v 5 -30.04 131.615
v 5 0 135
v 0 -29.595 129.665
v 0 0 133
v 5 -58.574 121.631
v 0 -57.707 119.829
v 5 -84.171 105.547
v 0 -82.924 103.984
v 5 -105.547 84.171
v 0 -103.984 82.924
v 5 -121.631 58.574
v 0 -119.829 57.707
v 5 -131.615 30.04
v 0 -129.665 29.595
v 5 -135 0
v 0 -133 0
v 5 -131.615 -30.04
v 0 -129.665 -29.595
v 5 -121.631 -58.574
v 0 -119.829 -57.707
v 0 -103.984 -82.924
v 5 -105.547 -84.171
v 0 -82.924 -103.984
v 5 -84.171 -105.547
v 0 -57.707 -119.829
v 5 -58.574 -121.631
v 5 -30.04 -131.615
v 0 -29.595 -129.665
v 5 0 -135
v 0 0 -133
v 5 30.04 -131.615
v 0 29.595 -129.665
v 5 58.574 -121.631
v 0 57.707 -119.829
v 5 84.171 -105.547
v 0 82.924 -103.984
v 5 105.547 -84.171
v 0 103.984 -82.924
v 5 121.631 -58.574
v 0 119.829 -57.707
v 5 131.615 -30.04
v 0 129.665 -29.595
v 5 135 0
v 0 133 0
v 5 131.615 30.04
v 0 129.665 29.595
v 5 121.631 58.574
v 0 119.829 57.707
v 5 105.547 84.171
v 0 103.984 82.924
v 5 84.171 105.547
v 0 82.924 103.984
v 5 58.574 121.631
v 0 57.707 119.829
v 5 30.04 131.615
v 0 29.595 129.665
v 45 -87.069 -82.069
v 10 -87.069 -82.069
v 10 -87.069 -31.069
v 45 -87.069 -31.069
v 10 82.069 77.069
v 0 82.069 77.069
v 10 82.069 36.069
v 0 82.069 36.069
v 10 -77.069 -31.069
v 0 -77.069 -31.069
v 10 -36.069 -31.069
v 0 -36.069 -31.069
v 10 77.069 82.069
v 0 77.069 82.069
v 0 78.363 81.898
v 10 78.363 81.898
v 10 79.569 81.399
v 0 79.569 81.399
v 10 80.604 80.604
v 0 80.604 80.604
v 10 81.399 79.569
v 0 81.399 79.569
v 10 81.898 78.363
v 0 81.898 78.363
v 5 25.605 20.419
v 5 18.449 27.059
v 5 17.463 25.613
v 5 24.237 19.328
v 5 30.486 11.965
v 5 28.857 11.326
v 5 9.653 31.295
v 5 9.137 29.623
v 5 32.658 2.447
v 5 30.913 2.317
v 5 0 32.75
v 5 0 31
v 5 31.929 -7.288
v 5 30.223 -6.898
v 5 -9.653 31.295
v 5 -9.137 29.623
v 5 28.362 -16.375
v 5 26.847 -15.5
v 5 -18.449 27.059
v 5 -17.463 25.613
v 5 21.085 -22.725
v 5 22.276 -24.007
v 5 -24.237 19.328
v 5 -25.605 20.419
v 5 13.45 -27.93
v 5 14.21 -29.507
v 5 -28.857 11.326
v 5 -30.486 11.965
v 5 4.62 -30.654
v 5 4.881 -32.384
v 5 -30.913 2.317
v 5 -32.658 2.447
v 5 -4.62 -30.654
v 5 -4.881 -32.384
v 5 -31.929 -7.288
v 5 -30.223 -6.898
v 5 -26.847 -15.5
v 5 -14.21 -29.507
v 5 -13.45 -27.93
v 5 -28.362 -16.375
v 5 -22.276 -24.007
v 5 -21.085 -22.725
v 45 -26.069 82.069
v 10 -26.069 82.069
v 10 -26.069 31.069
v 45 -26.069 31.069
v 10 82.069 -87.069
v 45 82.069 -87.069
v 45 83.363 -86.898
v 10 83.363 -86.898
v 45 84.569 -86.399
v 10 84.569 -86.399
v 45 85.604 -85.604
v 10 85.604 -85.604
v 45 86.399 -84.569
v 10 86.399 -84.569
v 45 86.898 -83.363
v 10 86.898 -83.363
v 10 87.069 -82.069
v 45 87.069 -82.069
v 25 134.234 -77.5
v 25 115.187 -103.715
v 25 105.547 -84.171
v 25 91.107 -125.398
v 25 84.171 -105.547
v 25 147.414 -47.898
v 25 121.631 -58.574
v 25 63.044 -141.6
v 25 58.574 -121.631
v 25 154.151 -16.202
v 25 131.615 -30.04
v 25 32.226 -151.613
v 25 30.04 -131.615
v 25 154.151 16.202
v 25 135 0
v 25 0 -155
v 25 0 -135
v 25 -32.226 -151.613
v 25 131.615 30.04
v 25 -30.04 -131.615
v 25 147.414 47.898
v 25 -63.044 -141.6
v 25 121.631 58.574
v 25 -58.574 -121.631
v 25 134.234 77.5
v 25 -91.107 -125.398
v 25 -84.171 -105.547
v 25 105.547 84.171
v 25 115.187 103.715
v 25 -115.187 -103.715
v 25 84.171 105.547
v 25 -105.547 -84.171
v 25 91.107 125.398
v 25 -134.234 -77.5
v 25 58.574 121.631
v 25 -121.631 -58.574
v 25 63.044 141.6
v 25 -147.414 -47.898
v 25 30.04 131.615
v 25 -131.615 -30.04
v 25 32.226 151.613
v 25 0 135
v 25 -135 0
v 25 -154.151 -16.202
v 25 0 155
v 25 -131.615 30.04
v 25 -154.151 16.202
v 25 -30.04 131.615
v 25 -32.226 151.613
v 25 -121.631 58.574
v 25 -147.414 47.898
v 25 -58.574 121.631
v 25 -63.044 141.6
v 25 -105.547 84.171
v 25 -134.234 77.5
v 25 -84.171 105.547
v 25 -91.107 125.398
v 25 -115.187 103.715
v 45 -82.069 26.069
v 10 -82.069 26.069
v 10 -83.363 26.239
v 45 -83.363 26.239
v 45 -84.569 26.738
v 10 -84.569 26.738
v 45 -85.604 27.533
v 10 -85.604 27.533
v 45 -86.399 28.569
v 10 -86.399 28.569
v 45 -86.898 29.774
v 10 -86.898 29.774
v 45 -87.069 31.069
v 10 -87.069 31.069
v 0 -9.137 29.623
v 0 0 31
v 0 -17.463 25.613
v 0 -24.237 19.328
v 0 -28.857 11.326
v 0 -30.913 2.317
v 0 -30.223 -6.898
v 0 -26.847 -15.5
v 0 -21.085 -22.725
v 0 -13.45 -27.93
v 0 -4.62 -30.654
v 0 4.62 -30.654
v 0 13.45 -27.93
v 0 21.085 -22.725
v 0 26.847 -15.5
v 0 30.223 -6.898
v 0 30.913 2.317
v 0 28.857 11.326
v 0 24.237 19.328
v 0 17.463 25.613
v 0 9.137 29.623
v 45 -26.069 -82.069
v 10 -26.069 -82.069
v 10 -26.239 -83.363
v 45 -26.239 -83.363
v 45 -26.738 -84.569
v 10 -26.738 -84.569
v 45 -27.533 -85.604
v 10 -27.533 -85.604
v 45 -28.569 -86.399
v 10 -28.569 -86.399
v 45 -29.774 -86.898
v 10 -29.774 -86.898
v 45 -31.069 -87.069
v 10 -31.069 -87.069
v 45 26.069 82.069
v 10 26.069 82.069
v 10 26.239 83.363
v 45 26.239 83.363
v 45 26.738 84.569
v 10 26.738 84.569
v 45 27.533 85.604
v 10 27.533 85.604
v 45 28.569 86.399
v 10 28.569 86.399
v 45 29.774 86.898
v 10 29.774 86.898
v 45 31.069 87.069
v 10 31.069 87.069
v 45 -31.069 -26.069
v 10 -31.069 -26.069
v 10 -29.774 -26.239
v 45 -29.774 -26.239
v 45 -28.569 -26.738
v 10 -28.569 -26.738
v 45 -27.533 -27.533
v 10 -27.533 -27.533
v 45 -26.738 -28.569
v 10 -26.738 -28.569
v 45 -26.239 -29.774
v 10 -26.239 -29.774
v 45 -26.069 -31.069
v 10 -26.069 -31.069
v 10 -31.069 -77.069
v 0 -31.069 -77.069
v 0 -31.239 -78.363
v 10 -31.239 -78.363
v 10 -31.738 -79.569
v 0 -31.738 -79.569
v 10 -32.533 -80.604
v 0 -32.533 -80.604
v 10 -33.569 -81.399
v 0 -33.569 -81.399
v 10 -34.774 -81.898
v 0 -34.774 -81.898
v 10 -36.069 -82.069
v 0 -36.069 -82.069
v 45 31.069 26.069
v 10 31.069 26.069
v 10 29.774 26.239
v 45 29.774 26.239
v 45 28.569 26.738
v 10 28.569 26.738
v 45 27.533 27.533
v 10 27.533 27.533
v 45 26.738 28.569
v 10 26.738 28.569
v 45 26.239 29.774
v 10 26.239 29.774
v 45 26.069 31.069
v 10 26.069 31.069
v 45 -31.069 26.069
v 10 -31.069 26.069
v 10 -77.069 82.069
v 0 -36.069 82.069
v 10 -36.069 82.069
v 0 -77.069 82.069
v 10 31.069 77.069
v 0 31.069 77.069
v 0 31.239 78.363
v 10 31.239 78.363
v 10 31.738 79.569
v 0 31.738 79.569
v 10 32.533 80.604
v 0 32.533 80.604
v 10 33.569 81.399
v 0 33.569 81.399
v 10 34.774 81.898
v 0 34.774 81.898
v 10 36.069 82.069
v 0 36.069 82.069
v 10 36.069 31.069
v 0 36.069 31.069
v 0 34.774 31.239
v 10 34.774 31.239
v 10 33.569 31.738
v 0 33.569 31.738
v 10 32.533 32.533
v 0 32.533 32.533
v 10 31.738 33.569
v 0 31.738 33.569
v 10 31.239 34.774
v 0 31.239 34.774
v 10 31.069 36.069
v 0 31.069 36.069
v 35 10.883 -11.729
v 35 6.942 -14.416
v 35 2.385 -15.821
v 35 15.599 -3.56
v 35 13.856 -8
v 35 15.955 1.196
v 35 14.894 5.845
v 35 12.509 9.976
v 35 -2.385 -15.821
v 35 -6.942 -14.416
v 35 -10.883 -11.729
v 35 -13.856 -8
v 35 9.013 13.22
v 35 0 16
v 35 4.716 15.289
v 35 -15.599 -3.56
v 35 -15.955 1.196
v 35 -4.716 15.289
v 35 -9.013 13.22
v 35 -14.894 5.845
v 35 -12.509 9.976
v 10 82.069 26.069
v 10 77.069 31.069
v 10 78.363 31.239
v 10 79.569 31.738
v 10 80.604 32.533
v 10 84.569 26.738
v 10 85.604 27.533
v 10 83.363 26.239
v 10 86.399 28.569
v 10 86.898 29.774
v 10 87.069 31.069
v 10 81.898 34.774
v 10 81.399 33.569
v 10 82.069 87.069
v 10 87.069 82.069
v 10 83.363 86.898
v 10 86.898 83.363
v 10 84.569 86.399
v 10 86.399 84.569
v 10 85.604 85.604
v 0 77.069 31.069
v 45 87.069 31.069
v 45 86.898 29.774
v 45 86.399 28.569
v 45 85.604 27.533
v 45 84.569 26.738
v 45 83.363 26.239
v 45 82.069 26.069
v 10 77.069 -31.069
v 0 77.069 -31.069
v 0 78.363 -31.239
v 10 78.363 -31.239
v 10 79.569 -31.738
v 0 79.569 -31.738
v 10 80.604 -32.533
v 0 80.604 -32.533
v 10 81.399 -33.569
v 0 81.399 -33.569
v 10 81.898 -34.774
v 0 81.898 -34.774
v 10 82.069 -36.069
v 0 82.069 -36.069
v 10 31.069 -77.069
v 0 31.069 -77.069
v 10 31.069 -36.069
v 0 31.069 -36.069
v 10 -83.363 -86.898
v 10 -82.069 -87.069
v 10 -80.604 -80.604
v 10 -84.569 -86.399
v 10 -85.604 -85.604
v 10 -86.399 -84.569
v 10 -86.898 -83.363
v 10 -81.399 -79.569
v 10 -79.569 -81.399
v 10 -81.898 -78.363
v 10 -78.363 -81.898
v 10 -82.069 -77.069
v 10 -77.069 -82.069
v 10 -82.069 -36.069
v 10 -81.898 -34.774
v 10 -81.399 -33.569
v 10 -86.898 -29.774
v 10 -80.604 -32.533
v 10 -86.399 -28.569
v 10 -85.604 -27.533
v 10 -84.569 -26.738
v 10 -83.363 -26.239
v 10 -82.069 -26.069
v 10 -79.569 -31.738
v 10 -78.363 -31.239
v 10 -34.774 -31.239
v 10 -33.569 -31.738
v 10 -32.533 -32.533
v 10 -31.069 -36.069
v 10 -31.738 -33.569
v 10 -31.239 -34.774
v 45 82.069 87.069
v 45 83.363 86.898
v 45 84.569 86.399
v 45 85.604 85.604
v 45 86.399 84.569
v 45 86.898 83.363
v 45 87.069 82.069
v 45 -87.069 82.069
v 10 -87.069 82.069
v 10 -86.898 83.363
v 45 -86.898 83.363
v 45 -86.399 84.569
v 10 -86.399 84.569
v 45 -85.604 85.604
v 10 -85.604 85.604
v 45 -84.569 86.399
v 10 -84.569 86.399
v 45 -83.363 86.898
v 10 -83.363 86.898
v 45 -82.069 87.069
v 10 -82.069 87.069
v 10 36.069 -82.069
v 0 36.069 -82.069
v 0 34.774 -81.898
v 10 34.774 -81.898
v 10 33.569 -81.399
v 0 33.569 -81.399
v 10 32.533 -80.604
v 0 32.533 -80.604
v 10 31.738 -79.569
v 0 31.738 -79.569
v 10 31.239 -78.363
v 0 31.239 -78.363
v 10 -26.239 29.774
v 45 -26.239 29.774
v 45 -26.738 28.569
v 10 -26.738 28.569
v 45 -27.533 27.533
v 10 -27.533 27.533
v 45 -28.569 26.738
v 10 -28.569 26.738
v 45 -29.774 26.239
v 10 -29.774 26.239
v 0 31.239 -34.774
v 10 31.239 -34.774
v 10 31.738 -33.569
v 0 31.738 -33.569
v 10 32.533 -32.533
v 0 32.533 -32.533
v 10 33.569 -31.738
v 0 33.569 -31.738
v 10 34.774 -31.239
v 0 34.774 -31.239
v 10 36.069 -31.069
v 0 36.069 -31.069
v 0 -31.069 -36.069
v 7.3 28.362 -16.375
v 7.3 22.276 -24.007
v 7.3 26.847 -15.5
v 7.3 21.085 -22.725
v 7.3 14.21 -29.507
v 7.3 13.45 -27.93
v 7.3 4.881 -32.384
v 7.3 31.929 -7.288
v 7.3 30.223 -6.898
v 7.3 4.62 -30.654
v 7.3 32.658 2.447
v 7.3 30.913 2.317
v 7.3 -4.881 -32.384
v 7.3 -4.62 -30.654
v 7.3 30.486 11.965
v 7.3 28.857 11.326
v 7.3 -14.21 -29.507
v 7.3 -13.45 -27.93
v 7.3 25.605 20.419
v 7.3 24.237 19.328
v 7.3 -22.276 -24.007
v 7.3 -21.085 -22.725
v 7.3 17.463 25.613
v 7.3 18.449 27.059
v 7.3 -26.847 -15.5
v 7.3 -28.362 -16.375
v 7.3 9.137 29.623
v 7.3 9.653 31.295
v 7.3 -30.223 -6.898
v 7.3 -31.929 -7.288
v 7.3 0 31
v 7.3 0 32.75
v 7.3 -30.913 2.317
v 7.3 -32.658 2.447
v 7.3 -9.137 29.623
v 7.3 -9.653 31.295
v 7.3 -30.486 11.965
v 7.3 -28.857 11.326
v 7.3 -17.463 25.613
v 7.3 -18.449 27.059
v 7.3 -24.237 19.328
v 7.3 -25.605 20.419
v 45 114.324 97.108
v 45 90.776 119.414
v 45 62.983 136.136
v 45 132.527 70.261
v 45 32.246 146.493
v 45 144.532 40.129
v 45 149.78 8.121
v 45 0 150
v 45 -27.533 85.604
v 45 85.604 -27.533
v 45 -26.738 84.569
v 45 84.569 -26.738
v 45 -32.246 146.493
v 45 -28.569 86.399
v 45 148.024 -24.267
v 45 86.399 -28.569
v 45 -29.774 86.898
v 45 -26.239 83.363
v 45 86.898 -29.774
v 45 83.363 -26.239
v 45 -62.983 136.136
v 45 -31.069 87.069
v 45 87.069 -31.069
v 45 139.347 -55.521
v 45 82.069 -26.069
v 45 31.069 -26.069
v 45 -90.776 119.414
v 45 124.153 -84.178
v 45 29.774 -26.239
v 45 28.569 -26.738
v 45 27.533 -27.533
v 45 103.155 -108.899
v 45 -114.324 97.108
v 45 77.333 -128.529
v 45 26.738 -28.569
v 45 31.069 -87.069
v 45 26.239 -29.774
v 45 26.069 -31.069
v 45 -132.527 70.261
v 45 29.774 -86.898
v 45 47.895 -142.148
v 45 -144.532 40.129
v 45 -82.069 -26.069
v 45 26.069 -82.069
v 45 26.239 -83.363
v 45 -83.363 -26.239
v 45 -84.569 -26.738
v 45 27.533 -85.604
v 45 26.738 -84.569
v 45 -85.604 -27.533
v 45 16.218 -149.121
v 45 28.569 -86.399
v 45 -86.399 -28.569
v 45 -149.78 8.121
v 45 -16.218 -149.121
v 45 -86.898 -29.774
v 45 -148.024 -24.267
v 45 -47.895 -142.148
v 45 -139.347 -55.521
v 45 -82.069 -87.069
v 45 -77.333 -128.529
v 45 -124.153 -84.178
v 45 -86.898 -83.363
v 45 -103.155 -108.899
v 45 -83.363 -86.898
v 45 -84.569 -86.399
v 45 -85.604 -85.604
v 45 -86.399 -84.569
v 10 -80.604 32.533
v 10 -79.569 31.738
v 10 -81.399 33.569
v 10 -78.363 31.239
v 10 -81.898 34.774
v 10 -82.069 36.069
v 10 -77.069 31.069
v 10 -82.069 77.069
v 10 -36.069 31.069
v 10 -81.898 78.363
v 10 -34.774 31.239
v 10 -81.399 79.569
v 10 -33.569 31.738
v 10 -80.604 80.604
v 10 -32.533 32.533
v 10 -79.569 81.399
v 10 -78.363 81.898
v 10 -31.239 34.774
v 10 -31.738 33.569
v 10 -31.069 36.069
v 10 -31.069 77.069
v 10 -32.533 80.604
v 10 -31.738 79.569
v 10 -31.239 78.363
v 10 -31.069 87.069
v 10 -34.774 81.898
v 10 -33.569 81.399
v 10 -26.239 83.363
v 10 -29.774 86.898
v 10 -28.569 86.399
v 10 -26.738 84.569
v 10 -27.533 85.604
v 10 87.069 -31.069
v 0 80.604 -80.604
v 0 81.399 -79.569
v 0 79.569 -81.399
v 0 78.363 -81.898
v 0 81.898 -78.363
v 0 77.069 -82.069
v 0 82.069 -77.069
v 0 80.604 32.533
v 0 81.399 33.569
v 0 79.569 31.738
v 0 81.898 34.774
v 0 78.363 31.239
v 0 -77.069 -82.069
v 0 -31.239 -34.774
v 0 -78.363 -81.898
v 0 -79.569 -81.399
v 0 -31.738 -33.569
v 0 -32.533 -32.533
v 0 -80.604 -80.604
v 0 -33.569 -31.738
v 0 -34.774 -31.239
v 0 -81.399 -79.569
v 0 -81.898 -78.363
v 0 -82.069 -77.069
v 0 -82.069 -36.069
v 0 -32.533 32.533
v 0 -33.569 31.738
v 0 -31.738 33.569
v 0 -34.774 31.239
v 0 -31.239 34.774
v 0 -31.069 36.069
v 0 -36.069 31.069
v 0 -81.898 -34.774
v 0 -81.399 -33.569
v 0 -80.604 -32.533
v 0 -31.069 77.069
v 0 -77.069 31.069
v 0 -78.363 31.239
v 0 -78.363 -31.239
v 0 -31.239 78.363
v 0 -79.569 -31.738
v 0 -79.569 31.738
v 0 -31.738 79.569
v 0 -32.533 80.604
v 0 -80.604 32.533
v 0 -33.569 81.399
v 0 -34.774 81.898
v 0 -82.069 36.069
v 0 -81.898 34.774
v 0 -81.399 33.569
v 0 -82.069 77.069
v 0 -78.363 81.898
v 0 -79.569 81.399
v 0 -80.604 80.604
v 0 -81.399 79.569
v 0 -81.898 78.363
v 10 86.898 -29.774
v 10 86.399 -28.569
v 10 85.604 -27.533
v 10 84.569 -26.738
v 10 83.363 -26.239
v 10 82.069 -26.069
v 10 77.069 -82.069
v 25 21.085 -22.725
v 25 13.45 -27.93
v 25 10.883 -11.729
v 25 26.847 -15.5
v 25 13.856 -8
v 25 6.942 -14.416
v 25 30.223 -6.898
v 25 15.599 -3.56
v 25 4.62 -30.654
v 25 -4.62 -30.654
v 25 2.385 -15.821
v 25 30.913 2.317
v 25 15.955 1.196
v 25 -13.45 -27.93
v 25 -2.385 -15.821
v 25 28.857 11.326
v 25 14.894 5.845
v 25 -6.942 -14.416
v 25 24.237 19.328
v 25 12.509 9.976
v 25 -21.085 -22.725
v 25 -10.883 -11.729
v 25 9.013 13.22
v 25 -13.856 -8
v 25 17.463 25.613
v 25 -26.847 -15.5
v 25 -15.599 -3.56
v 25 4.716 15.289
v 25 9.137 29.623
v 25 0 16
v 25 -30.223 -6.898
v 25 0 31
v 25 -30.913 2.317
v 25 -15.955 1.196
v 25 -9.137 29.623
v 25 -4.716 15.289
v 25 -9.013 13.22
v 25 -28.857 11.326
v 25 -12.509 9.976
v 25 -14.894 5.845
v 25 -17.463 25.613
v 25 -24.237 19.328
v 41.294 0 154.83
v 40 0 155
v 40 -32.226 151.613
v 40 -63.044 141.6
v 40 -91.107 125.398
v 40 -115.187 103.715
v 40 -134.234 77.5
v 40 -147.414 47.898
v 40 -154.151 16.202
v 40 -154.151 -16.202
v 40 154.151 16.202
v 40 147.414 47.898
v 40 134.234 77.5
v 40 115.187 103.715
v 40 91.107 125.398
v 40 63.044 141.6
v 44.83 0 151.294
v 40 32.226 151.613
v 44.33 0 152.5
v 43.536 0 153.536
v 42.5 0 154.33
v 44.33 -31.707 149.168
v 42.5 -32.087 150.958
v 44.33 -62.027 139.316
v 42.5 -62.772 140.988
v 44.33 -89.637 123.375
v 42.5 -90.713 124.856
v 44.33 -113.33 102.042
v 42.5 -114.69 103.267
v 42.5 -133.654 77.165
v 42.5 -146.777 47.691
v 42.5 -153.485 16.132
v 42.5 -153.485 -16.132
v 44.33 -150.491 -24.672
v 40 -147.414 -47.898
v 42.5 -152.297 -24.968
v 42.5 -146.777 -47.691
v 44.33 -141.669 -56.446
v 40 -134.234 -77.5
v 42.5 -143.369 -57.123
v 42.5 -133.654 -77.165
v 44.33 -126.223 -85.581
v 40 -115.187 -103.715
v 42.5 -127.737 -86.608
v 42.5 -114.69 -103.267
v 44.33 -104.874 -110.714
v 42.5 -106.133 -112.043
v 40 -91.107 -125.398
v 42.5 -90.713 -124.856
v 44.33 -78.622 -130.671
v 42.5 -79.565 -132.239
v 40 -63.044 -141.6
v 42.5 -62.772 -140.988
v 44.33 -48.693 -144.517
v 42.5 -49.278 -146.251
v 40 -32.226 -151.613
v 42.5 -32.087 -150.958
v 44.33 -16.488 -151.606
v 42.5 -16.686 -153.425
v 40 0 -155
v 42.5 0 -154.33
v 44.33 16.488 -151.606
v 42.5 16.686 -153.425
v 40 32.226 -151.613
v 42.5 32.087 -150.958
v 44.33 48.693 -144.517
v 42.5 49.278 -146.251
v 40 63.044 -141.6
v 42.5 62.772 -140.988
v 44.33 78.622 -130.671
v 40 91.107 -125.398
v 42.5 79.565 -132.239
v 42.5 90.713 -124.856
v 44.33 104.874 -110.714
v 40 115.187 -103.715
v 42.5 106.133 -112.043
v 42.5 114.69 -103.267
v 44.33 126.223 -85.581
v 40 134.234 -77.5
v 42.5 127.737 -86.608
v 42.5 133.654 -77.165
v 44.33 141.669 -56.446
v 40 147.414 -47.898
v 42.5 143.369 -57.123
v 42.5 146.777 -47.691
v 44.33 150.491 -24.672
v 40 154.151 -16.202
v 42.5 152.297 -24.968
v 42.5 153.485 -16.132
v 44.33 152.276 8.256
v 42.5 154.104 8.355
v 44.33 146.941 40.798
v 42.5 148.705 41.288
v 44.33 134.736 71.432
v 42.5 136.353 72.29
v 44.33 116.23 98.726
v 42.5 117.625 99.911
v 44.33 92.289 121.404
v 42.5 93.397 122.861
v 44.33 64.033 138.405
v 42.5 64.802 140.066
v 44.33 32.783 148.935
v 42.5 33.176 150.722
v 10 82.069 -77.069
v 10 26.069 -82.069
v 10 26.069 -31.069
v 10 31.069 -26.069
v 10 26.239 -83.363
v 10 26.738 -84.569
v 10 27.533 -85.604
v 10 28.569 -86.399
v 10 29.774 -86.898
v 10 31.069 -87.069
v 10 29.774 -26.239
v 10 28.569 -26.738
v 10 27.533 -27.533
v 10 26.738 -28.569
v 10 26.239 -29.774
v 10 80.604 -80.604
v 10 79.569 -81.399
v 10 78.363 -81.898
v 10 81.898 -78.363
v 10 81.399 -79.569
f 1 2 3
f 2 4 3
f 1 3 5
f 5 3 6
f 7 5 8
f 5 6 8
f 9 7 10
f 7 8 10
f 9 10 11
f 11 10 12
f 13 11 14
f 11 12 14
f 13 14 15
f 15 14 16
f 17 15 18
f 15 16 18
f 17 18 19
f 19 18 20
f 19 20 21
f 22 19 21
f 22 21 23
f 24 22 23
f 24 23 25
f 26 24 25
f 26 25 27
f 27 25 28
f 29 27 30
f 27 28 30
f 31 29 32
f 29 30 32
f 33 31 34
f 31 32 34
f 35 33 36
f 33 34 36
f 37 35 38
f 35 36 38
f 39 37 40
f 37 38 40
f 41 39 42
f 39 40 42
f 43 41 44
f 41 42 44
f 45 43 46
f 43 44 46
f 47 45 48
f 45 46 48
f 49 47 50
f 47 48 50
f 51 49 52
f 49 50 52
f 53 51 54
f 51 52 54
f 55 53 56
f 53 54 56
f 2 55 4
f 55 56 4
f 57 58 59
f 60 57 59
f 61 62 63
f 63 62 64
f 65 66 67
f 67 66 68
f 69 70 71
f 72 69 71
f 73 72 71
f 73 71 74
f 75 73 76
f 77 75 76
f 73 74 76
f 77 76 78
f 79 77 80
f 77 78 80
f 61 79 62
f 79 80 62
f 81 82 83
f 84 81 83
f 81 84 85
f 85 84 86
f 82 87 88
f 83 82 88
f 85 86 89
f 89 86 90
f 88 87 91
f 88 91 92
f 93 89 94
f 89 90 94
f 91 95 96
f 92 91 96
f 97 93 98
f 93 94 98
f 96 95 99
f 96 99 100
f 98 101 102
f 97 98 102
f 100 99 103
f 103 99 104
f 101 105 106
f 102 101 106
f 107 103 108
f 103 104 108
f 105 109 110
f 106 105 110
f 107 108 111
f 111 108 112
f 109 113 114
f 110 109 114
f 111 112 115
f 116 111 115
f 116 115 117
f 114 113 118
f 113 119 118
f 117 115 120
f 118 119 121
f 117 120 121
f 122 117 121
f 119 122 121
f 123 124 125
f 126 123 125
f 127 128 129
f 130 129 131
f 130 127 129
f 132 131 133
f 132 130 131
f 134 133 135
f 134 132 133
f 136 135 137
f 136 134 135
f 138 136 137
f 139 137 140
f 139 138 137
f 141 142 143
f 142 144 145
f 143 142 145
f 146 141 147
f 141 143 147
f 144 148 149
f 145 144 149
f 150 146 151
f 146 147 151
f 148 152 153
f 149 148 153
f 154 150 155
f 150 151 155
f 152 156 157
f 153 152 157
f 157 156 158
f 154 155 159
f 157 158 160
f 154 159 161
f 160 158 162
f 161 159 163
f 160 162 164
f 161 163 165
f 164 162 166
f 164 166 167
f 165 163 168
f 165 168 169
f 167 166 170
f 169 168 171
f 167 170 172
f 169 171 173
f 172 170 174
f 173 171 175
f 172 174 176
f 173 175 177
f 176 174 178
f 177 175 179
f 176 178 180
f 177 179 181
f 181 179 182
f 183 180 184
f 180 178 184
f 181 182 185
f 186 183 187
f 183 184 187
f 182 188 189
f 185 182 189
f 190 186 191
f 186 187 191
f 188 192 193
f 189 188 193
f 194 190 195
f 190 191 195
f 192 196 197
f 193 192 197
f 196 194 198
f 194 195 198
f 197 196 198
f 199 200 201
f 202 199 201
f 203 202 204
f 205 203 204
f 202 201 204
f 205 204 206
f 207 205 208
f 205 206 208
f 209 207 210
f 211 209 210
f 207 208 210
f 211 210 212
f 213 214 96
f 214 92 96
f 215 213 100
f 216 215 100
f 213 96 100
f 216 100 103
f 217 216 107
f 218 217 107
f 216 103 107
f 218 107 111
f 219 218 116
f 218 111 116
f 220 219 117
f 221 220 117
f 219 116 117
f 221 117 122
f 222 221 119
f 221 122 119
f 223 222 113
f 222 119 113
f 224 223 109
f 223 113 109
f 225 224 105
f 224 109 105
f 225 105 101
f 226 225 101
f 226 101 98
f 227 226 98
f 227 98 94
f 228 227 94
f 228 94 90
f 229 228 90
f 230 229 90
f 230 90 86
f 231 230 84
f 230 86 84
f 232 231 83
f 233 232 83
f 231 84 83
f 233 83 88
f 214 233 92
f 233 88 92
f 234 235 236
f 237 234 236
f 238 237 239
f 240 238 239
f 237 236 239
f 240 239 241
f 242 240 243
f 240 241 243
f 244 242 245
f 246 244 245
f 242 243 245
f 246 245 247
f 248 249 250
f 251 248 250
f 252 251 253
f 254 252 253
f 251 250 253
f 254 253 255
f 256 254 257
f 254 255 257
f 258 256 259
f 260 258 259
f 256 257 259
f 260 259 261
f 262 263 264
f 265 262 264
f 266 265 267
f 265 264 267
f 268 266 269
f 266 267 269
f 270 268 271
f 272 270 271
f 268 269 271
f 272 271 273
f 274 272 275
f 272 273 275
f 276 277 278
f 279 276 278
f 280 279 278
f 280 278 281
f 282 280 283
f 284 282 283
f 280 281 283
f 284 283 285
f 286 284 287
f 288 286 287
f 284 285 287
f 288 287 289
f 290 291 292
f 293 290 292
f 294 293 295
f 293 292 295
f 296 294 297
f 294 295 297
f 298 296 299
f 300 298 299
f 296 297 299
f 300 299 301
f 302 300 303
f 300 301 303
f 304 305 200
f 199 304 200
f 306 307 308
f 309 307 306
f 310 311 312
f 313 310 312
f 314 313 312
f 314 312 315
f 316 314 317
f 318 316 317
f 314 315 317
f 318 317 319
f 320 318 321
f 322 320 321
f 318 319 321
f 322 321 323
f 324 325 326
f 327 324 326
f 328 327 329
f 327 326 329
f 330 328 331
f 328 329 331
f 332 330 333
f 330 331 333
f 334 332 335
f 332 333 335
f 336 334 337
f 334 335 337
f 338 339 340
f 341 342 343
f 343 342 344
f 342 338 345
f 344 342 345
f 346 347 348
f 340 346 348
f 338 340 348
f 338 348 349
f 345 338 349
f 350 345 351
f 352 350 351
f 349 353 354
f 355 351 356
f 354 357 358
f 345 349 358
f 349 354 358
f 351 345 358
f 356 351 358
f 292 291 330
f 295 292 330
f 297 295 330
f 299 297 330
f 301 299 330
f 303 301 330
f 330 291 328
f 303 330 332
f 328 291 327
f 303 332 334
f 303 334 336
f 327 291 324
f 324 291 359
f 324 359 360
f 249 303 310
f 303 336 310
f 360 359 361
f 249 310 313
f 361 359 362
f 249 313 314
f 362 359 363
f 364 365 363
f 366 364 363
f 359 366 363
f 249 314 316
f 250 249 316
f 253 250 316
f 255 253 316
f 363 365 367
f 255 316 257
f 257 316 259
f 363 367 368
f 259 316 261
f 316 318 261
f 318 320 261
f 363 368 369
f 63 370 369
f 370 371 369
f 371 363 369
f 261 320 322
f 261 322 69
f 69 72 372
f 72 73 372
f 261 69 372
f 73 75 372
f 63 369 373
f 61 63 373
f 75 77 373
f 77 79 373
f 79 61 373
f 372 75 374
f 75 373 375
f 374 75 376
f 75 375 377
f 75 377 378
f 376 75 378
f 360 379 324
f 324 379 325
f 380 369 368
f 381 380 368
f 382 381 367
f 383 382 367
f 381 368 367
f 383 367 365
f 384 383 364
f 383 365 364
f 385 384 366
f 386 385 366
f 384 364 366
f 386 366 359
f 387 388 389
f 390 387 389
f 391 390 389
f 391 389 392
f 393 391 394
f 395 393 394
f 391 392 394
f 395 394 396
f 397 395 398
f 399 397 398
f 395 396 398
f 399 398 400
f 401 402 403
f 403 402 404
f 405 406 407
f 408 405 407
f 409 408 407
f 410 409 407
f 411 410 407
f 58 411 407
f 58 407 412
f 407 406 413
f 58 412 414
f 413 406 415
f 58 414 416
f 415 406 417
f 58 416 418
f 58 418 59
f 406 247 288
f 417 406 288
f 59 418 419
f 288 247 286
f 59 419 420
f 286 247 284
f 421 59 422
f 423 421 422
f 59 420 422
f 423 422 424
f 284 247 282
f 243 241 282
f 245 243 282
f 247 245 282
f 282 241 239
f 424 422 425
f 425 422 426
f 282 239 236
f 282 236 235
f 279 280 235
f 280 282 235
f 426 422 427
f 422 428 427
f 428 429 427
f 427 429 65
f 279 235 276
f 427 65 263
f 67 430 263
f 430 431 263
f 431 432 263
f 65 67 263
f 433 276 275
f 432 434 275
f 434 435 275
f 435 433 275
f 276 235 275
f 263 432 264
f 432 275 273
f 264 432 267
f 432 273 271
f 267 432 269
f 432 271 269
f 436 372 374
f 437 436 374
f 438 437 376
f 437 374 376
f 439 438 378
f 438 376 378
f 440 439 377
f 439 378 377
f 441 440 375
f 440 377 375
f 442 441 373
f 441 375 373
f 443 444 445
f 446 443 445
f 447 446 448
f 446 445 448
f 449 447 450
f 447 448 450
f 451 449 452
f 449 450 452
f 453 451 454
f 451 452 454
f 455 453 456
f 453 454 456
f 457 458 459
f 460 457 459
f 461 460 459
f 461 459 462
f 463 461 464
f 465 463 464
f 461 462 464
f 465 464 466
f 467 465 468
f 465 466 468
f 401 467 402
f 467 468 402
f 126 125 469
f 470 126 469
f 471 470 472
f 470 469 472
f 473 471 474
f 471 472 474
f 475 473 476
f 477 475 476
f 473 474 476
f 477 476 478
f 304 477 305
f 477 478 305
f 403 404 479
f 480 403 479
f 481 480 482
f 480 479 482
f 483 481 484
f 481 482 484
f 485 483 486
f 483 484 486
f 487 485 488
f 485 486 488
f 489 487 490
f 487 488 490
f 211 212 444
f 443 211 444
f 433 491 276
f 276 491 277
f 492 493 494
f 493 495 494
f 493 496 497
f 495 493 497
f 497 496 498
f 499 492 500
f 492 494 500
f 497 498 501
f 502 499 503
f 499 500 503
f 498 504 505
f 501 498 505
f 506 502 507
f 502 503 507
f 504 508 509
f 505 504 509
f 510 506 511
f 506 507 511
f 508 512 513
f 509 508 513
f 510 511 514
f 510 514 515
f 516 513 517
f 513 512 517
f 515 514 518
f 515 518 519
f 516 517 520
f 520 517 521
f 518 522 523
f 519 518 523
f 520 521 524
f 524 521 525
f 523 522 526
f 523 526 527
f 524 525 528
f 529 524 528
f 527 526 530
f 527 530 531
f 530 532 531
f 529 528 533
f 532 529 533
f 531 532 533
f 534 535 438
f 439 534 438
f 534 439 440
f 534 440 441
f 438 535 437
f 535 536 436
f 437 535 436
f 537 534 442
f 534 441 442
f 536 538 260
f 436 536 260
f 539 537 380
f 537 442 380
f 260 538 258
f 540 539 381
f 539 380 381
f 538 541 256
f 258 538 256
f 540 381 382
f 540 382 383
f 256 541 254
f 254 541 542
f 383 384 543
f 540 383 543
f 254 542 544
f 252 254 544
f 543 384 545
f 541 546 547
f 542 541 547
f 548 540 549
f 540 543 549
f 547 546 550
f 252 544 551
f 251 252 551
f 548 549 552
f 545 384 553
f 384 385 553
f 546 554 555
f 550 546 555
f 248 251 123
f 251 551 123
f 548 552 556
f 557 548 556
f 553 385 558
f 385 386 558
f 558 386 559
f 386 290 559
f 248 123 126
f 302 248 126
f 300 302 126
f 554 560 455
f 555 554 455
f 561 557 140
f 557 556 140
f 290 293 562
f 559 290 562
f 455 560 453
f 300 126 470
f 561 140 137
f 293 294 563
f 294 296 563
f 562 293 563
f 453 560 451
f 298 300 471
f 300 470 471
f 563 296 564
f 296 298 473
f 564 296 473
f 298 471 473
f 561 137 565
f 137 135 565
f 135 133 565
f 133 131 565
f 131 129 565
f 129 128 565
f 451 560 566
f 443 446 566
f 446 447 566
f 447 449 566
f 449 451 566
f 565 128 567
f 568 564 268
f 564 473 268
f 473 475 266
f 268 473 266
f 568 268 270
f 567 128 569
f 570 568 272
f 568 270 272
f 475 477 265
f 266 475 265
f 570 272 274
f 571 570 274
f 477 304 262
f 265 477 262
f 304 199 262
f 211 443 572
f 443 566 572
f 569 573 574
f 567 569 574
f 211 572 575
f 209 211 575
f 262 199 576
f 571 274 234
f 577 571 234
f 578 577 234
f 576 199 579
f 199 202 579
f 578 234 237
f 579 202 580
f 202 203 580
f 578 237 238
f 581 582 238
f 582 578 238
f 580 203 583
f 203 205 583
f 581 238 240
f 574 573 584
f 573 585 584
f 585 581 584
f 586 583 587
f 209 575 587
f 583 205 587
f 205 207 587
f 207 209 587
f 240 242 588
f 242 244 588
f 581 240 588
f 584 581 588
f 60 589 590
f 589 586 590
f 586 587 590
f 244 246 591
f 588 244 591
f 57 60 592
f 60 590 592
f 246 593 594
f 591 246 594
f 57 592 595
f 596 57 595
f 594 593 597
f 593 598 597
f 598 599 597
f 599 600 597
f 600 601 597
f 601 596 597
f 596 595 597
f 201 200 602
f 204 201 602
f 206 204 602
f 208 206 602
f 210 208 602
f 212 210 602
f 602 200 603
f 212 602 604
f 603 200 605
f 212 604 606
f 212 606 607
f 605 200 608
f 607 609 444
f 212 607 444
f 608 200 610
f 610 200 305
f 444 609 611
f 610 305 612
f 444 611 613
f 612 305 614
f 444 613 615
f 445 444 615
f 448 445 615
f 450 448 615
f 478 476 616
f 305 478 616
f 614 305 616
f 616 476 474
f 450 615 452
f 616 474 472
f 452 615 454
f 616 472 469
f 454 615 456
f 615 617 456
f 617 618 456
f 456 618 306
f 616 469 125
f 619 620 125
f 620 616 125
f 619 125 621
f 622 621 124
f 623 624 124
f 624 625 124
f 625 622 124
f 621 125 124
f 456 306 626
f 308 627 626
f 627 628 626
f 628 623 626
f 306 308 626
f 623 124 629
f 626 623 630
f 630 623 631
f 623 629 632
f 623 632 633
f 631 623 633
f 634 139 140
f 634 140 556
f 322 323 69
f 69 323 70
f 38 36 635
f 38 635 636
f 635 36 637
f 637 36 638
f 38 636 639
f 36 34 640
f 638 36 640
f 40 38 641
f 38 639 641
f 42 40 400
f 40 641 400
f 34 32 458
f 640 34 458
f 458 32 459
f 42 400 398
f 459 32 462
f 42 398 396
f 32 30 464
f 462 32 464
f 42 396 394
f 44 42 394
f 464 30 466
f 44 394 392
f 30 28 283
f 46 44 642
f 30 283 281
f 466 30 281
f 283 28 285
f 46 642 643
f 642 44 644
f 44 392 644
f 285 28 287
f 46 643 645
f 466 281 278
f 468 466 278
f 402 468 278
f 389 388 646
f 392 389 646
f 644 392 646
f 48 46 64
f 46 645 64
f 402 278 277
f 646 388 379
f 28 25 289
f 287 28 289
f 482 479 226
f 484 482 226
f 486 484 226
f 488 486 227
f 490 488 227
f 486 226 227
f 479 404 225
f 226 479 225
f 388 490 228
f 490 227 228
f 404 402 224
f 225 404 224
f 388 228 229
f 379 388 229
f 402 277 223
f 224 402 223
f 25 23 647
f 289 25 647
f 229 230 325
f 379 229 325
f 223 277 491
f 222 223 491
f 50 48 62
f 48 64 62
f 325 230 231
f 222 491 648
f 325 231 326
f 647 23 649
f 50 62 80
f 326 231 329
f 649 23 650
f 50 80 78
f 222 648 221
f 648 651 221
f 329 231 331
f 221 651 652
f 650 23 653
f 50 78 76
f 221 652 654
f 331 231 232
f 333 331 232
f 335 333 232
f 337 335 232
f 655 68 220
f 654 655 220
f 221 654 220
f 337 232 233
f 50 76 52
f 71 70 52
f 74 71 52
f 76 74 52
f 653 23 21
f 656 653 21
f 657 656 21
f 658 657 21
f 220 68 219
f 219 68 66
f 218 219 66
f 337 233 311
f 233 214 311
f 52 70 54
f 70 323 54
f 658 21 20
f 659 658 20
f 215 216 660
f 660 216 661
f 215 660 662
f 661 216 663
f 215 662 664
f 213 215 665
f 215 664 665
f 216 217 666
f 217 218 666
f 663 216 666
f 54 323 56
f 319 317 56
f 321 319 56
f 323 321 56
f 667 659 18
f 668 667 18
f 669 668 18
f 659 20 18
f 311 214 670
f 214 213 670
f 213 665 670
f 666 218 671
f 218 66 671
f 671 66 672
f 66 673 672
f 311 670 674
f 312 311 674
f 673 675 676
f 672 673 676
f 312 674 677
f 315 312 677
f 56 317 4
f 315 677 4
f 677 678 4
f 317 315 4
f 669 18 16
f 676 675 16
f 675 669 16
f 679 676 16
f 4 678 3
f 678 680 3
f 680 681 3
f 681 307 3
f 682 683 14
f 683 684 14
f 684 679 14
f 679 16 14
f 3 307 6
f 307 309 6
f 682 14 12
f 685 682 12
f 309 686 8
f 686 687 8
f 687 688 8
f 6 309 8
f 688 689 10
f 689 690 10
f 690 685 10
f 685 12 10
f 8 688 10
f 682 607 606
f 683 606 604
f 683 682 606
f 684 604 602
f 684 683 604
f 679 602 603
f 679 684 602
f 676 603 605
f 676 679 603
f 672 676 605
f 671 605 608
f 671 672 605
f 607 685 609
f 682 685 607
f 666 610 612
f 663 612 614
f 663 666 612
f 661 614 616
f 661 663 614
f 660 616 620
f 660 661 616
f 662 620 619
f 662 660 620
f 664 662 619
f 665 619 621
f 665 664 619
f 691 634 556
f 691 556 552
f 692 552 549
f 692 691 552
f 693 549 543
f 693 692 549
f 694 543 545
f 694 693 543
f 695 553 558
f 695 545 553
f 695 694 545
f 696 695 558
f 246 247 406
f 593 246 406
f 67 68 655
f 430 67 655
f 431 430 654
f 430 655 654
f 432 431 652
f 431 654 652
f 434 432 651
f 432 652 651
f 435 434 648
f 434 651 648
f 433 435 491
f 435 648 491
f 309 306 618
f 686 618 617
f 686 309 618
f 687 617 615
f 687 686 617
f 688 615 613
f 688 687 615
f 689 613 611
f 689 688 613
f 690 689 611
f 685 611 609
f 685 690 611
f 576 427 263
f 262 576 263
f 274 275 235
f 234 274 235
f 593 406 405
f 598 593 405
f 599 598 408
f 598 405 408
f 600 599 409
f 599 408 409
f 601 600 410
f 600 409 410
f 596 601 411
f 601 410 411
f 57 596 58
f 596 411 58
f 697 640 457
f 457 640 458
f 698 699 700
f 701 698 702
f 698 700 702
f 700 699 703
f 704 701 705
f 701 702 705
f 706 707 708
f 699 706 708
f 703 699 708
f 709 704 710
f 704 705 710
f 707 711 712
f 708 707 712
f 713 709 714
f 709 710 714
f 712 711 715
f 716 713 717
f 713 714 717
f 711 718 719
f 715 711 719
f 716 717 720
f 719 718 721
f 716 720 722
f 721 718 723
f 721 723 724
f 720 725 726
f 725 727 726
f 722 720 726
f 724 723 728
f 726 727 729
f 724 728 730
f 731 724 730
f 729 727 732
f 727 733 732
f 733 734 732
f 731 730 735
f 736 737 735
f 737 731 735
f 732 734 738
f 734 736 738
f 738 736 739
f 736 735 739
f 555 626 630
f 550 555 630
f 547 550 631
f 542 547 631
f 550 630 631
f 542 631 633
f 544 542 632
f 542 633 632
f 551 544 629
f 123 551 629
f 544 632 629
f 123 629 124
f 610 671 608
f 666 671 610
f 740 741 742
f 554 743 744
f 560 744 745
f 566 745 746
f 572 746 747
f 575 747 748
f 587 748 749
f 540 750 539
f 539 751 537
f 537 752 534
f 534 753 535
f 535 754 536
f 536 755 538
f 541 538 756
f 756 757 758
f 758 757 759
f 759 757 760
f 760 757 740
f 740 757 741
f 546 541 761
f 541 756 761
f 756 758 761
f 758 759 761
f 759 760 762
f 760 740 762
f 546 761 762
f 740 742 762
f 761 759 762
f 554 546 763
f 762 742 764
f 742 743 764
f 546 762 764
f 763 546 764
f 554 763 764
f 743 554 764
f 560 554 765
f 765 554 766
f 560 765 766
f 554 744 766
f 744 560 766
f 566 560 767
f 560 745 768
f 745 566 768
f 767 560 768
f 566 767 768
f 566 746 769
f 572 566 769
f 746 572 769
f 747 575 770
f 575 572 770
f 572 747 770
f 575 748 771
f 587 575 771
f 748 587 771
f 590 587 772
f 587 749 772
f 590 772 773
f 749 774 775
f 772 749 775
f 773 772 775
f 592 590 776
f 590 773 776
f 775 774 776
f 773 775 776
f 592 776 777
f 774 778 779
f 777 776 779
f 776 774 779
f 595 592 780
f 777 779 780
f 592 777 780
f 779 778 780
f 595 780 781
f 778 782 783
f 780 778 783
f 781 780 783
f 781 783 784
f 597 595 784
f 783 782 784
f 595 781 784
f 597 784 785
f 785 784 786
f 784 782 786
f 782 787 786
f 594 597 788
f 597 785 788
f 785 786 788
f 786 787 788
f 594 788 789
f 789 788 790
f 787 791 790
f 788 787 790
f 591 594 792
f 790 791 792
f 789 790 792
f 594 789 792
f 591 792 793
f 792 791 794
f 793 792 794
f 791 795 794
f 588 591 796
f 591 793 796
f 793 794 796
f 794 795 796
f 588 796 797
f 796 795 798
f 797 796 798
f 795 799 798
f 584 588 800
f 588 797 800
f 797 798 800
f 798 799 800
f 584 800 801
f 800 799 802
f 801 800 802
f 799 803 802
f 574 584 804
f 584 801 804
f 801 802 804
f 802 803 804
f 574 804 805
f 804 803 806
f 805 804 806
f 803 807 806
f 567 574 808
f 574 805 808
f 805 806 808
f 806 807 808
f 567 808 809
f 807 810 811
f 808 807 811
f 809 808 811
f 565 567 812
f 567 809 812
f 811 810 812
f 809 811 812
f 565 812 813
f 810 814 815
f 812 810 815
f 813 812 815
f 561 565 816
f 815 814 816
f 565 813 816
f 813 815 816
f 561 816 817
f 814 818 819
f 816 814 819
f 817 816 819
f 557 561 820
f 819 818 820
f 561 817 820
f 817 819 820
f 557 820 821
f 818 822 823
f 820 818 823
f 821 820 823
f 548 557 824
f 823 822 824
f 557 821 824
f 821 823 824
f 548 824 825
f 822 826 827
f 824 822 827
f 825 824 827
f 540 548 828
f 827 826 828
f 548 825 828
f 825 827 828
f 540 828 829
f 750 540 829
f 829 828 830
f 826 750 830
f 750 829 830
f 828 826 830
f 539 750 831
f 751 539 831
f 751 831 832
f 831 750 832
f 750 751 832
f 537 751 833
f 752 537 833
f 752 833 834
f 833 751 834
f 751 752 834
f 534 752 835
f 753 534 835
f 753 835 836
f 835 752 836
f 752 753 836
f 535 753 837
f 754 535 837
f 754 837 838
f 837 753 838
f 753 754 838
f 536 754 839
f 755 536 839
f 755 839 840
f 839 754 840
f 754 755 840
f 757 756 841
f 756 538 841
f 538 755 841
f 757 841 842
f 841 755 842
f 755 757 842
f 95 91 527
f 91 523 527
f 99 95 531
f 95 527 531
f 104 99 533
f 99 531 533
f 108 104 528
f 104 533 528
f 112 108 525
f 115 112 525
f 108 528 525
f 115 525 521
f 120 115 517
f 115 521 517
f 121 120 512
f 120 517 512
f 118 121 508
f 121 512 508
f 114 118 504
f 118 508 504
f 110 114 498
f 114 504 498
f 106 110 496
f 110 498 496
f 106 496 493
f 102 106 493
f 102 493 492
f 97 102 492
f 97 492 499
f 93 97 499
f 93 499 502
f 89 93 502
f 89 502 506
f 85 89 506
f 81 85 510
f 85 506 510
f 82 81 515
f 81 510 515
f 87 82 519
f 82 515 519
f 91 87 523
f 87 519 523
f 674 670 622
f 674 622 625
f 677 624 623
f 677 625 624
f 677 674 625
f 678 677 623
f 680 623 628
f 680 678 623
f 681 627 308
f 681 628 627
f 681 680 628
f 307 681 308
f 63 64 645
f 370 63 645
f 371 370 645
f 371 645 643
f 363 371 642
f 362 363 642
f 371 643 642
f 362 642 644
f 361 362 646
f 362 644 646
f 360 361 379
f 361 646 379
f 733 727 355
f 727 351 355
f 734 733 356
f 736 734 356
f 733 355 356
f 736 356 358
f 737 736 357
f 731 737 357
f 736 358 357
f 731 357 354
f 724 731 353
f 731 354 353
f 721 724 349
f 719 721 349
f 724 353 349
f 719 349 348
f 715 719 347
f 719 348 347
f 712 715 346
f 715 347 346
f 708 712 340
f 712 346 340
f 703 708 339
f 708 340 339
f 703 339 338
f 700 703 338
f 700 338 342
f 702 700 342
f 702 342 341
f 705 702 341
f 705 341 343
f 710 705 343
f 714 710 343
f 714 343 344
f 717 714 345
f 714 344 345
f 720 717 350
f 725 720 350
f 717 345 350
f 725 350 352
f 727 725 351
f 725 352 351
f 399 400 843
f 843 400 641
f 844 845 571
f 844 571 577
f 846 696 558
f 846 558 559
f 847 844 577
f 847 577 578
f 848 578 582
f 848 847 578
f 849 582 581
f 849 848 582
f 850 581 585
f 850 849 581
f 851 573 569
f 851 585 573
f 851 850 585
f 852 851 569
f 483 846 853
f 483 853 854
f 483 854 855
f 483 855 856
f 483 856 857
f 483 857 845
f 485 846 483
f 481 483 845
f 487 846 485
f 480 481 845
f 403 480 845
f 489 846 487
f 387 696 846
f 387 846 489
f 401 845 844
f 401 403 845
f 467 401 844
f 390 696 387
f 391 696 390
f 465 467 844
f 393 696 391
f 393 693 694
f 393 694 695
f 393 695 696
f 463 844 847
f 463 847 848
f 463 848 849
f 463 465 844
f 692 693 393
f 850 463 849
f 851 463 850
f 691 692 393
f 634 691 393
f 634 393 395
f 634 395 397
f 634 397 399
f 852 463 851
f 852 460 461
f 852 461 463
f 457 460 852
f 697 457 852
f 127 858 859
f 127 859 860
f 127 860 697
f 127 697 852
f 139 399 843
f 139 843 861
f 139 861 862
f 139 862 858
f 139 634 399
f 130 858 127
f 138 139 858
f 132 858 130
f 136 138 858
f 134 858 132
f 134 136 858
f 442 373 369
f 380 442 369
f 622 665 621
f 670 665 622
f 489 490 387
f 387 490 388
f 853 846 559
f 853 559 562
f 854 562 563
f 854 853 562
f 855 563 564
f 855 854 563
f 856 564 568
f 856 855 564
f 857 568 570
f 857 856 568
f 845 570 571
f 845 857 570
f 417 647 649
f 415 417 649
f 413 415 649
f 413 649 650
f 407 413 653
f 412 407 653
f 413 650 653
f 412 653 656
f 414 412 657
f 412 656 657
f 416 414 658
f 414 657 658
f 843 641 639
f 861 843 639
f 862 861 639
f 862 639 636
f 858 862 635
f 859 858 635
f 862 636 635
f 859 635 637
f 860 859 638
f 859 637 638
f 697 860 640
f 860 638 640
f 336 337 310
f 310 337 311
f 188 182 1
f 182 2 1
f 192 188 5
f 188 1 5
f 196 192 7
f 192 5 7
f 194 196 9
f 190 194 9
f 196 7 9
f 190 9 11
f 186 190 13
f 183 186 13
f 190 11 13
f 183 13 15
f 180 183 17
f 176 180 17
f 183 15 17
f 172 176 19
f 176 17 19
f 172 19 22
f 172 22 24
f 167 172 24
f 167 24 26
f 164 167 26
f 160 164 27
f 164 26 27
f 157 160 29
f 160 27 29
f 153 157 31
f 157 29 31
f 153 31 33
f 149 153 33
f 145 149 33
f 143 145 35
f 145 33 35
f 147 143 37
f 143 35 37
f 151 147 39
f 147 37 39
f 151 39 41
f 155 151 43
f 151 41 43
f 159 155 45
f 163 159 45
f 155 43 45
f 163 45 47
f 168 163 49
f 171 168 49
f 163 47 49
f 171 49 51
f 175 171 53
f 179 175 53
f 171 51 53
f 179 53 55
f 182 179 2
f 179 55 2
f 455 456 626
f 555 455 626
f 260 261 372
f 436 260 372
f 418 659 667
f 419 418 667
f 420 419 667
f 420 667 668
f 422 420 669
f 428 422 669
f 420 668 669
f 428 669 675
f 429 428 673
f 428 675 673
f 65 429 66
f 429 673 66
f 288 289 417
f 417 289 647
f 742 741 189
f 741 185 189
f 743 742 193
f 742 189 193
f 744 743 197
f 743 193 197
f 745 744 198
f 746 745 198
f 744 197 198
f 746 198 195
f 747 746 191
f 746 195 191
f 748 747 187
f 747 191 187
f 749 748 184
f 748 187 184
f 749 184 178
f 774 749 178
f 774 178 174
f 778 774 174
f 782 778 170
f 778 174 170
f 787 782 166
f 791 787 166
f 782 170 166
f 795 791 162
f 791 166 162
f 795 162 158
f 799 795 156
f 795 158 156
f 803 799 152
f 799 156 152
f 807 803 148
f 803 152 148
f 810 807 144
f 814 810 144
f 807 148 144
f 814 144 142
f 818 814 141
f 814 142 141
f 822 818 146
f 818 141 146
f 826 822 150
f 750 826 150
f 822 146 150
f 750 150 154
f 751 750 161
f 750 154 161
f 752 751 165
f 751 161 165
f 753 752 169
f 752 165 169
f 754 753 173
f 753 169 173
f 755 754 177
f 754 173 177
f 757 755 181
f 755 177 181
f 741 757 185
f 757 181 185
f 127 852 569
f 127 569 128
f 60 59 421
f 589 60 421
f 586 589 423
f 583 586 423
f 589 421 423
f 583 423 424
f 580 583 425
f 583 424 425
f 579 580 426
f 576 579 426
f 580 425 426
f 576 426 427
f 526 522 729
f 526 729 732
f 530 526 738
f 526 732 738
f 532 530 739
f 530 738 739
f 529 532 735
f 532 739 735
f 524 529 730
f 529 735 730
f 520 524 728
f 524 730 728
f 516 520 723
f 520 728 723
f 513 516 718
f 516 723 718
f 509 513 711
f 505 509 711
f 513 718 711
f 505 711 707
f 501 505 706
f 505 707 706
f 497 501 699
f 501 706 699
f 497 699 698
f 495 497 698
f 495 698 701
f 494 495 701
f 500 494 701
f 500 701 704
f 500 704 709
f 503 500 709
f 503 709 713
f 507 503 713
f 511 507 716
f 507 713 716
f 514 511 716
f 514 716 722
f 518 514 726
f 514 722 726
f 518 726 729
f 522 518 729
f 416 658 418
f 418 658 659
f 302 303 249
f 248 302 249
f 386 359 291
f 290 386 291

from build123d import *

# Parameters (mm, degrees)
CUT_EXTRUDE1_START = -10
CUT_EXTRUDE1_DEPTH = 214.774440026
CUT_EXTRUDE2_DEPTH = 224.774440026


with BuildPart() as part:
    # Çizim1 → Döndür1 (revolve)
    with BuildSketch(Plane.XY, mode=Mode.PRIVATE) as d_nd_r1_sk:
        with BuildLine():
            Line((0, 31), (5, 31))
            Line((5, 31), (5, 32.75))
            Line((5, 32.75), (7.3, 32.75))
            Line((7.3, 32.75), (7.3, 31))
            Line((7.3, 31), (25, 31))
            Line((25, 31), (25, 16))
            Line((25, 16), (35, 16))
            Line((35, 16), (35, 0))
            Line((35, 0), (45, 0))
            Line((45, 0), (45, 148.5))
            Line((45, 148.5), (45, 150))
            ThreePointArc((45, 150), (43.535533906, 153.535533906), (40, 155))
            Line((40, 155), (25, 155))
            Line((25, 155), (25, 135))
            Line((25, 135), (5, 135))
            Line((5, 135), (0, 133))
            Line((0, 133), (0, 31))
        make_face()
    revolve(d_nd_r1_sk.sketch.rotate(Axis((0, 0, 0), (1, 0, 0)), 90), axis=Axis((0, 0, 0), (1, 0, 0)))

    # Sketch2 → Cut-Extrude1 (cut, through all)
    with BuildSketch(Plane.ZY.offset(CUT_EXTRUDE1_START)):
        with BuildLine():
            Line((82.068542495, 87.068542495), (31.068542495, 87.068542495))
            ThreePointArc((31.068542495, 87.068542495), (27.533008589, 85.604076401), (26.068542495, 82.068542495))
            Line((26.068542495, 82.068542495), (26.068542495, 31.068542495))
            ThreePointArc((26.068542495, 31.068542495), (27.533008589, 27.533008589), (31.068542495, 26.068542495))
            Line((31.068542495, 26.068542495), (82.068542495, 26.068542495))
            ThreePointArc((82.068542495, 26.068542495), (85.604076401, 27.533008589), (87.068542495, 31.068542495))
            Line((87.068542495, 31.068542495), (87.068542495, 82.068542495))
            ThreePointArc((87.068542495, 82.068542495), (85.604076401, 85.604076401), (82.068542495, 87.068542495))
        make_face()
        with BuildLine():
            Line((-82.068542495, 87.068542495), (-31.068542495, 87.068542495))
            ThreePointArc((-31.068542495, 87.068542495), (-27.533008589, 85.604076401), (-26.068542495, 82.068542495))
            Line((-26.068542495, 82.068542495), (-26.068542495, 31.068542495))
            ThreePointArc((-26.068542495, 31.068542495), (-27.533008589, 27.533008589), (-31.068542495, 26.068542495))
            Line((-31.068542495, 26.068542495), (-82.068542495, 26.068542495))
            ThreePointArc((-82.068542495, 26.068542495), (-85.604076401, 27.533008589), (-87.068542495, 31.068542495))
            Line((-87.068542495, 31.068542495), (-87.068542495, 82.068542495))
            ThreePointArc((-87.068542495, 82.068542495), (-85.604076401, 85.604076401), (-82.068542495, 87.068542495))
        make_face()
        with BuildLine():
            Line((87.068542495, -82.068542495), (87.068542495, -31.068542495))
            ThreePointArc((87.068542495, -31.068542495), (85.604076401, -27.533008589), (82.068542495, -26.068542495))
            Line((82.068542495, -26.068542495), (31.068542495, -26.068542495))
            ThreePointArc((31.068542495, -26.068542495), (27.533008589, -27.533008589), (26.068542495, -31.068542495))
            Line((26.068542495, -31.068542495), (26.068542495, -82.068542495))
            ThreePointArc((26.068542495, -82.068542495), (27.533008589, -85.604076401), (31.068542495, -87.068542495))
            Line((31.068542495, -87.068542495), (82.068542495, -87.068542495))
            ThreePointArc((82.068542495, -87.068542495), (85.604076401, -85.604076401), (87.068542495, -82.068542495))
        make_face()
        with BuildLine():
            Line((-82.068542495, -87.068542495), (-31.068542495, -87.068542495))
            ThreePointArc((-31.068542495, -87.068542495), (-27.533008589, -85.604076401), (-26.068542495, -82.068542495))
            Line((-26.068542495, -82.068542495), (-26.068542495, -31.068542495))
            ThreePointArc((-26.068542495, -31.068542495), (-27.533008589, -27.533008589), (-31.068542495, -26.068542495))
            Line((-31.068542495, -26.068542495), (-82.068542495, -26.068542495))
            ThreePointArc((-82.068542495, -26.068542495), (-85.604076401, -27.533008589), (-87.068542495, -31.068542495))
            Line((-87.068542495, -31.068542495), (-87.068542495, -82.068542495))
            ThreePointArc((-87.068542495, -82.068542495), (-85.604076401, -85.604076401), (-82.068542495, -87.068542495))
        make_face()
    extrude(amount=-CUT_EXTRUDE1_DEPTH, mode=Mode.SUBTRACT)

    # Sketch4 → Cut-Extrude2 (cut, through all)
    with BuildSketch(Plane.ZY):
        with BuildLine():
            Line((36.068542495, -31.068542495), (77.068542495, -31.068542495))
            ThreePointArc((77.068542495, -31.068542495), (80.604076401, -32.533008589), (82.068542495, -36.068542495))
            Line((82.068542495, -36.068542495), (82.068542495, -77.068542495))
            ThreePointArc((82.068542495, -77.068542495), (80.604076401, -80.604076401), (77.068542495, -82.068542495))
            Line((77.068542495, -82.068542495), (36.068542495, -82.068542495))
            ThreePointArc((36.068542495, -82.068542495), (32.533008589, -80.604076401), (31.068542495, -77.068542495))
            Line((31.068542495, -77.068542495), (31.068542495, -36.068542495))
            ThreePointArc((31.068542495, -36.068542495), (32.533008589, -32.533008589), (36.068542495, -31.068542495))
        make_face()
        with BuildLine():
            Line((-36.068542495, -31.068542495), (-77.068542495, -31.068542495))
            ThreePointArc((-77.068542495, -31.068542495), (-80.604076401, -32.533008589), (-82.068542495, -36.068542495))
            Line((-82.068542495, -36.068542495), (-82.068542495, -77.068542495))
            ThreePointArc((-82.068542495, -77.068542495), (-80.604076401, -80.604076401), (-77.068542495, -82.068542495))
            Line((-77.068542495, -82.068542495), (-36.068542495, -82.068542495))
            ThreePointArc((-36.068542495, -82.068542495), (-32.533008589, -80.604076401), (-31.068542495, -77.068542495))
            Line((-31.068542495, -77.068542495), (-31.068542495, -36.068542495))
            ThreePointArc((-31.068542495, -36.068542495), (-32.533008589, -32.533008589), (-36.068542495, -31.068542495))
        make_face()
        with BuildLine():
            Line((-31.068542495, 36.068542495), (-31.068542495, 77.068542495))
            ThreePointArc((-31.068542495, 77.068542495), (-32.533008589, 80.604076401), (-36.068542495, 82.068542495))
            Line((-36.068542495, 82.068542495), (-77.068542495, 82.068542495))
            ThreePointArc((-77.068542495, 82.068542495), (-80.604076401, 80.604076401), (-82.068542495, 77.068542495))
            Line((-82.068542495, 77.068542495), (-82.068542495, 36.068542495))
            ThreePointArc((-82.068542495, 36.068542495), (-80.604076401, 32.533008589), (-77.068542495, 31.068542495))
            Line((-77.068542495, 31.068542495), (-36.068542495, 31.068542495))
            ThreePointArc((-36.068542495, 31.068542495), (-32.533008589, 32.533008589), (-31.068542495, 36.068542495))
        make_face()
        with BuildLine():
            Line((36.068542495, 31.068542495), (77.068542495, 31.068542495))
            ThreePointArc((77.068542495, 31.068542495), (80.604076401, 32.533008589), (82.068542495, 36.068542495))
            Line((82.068542495, 36.068542495), (82.068542495, 77.068542495))
            ThreePointArc((82.068542495, 77.068542495), (80.604076401, 80.604076401), (77.068542495, 82.068542495))
            Line((77.068542495, 82.068542495), (36.068542495, 82.068542495))
            ThreePointArc((36.068542495, 82.068542495), (32.533008589, 80.604076401), (31.068542495, 77.068542495))
            Line((31.068542495, 77.068542495), (31.068542495, 36.068542495))
            ThreePointArc((31.068542495, 36.068542495), (32.533008589, 32.533008589), (36.068542495, 31.068542495))
        make_face()
    extrude(amount=-CUT_EXTRUDE2_DEPTH, mode=Mode.SUBTRACT)


solid = part.part
